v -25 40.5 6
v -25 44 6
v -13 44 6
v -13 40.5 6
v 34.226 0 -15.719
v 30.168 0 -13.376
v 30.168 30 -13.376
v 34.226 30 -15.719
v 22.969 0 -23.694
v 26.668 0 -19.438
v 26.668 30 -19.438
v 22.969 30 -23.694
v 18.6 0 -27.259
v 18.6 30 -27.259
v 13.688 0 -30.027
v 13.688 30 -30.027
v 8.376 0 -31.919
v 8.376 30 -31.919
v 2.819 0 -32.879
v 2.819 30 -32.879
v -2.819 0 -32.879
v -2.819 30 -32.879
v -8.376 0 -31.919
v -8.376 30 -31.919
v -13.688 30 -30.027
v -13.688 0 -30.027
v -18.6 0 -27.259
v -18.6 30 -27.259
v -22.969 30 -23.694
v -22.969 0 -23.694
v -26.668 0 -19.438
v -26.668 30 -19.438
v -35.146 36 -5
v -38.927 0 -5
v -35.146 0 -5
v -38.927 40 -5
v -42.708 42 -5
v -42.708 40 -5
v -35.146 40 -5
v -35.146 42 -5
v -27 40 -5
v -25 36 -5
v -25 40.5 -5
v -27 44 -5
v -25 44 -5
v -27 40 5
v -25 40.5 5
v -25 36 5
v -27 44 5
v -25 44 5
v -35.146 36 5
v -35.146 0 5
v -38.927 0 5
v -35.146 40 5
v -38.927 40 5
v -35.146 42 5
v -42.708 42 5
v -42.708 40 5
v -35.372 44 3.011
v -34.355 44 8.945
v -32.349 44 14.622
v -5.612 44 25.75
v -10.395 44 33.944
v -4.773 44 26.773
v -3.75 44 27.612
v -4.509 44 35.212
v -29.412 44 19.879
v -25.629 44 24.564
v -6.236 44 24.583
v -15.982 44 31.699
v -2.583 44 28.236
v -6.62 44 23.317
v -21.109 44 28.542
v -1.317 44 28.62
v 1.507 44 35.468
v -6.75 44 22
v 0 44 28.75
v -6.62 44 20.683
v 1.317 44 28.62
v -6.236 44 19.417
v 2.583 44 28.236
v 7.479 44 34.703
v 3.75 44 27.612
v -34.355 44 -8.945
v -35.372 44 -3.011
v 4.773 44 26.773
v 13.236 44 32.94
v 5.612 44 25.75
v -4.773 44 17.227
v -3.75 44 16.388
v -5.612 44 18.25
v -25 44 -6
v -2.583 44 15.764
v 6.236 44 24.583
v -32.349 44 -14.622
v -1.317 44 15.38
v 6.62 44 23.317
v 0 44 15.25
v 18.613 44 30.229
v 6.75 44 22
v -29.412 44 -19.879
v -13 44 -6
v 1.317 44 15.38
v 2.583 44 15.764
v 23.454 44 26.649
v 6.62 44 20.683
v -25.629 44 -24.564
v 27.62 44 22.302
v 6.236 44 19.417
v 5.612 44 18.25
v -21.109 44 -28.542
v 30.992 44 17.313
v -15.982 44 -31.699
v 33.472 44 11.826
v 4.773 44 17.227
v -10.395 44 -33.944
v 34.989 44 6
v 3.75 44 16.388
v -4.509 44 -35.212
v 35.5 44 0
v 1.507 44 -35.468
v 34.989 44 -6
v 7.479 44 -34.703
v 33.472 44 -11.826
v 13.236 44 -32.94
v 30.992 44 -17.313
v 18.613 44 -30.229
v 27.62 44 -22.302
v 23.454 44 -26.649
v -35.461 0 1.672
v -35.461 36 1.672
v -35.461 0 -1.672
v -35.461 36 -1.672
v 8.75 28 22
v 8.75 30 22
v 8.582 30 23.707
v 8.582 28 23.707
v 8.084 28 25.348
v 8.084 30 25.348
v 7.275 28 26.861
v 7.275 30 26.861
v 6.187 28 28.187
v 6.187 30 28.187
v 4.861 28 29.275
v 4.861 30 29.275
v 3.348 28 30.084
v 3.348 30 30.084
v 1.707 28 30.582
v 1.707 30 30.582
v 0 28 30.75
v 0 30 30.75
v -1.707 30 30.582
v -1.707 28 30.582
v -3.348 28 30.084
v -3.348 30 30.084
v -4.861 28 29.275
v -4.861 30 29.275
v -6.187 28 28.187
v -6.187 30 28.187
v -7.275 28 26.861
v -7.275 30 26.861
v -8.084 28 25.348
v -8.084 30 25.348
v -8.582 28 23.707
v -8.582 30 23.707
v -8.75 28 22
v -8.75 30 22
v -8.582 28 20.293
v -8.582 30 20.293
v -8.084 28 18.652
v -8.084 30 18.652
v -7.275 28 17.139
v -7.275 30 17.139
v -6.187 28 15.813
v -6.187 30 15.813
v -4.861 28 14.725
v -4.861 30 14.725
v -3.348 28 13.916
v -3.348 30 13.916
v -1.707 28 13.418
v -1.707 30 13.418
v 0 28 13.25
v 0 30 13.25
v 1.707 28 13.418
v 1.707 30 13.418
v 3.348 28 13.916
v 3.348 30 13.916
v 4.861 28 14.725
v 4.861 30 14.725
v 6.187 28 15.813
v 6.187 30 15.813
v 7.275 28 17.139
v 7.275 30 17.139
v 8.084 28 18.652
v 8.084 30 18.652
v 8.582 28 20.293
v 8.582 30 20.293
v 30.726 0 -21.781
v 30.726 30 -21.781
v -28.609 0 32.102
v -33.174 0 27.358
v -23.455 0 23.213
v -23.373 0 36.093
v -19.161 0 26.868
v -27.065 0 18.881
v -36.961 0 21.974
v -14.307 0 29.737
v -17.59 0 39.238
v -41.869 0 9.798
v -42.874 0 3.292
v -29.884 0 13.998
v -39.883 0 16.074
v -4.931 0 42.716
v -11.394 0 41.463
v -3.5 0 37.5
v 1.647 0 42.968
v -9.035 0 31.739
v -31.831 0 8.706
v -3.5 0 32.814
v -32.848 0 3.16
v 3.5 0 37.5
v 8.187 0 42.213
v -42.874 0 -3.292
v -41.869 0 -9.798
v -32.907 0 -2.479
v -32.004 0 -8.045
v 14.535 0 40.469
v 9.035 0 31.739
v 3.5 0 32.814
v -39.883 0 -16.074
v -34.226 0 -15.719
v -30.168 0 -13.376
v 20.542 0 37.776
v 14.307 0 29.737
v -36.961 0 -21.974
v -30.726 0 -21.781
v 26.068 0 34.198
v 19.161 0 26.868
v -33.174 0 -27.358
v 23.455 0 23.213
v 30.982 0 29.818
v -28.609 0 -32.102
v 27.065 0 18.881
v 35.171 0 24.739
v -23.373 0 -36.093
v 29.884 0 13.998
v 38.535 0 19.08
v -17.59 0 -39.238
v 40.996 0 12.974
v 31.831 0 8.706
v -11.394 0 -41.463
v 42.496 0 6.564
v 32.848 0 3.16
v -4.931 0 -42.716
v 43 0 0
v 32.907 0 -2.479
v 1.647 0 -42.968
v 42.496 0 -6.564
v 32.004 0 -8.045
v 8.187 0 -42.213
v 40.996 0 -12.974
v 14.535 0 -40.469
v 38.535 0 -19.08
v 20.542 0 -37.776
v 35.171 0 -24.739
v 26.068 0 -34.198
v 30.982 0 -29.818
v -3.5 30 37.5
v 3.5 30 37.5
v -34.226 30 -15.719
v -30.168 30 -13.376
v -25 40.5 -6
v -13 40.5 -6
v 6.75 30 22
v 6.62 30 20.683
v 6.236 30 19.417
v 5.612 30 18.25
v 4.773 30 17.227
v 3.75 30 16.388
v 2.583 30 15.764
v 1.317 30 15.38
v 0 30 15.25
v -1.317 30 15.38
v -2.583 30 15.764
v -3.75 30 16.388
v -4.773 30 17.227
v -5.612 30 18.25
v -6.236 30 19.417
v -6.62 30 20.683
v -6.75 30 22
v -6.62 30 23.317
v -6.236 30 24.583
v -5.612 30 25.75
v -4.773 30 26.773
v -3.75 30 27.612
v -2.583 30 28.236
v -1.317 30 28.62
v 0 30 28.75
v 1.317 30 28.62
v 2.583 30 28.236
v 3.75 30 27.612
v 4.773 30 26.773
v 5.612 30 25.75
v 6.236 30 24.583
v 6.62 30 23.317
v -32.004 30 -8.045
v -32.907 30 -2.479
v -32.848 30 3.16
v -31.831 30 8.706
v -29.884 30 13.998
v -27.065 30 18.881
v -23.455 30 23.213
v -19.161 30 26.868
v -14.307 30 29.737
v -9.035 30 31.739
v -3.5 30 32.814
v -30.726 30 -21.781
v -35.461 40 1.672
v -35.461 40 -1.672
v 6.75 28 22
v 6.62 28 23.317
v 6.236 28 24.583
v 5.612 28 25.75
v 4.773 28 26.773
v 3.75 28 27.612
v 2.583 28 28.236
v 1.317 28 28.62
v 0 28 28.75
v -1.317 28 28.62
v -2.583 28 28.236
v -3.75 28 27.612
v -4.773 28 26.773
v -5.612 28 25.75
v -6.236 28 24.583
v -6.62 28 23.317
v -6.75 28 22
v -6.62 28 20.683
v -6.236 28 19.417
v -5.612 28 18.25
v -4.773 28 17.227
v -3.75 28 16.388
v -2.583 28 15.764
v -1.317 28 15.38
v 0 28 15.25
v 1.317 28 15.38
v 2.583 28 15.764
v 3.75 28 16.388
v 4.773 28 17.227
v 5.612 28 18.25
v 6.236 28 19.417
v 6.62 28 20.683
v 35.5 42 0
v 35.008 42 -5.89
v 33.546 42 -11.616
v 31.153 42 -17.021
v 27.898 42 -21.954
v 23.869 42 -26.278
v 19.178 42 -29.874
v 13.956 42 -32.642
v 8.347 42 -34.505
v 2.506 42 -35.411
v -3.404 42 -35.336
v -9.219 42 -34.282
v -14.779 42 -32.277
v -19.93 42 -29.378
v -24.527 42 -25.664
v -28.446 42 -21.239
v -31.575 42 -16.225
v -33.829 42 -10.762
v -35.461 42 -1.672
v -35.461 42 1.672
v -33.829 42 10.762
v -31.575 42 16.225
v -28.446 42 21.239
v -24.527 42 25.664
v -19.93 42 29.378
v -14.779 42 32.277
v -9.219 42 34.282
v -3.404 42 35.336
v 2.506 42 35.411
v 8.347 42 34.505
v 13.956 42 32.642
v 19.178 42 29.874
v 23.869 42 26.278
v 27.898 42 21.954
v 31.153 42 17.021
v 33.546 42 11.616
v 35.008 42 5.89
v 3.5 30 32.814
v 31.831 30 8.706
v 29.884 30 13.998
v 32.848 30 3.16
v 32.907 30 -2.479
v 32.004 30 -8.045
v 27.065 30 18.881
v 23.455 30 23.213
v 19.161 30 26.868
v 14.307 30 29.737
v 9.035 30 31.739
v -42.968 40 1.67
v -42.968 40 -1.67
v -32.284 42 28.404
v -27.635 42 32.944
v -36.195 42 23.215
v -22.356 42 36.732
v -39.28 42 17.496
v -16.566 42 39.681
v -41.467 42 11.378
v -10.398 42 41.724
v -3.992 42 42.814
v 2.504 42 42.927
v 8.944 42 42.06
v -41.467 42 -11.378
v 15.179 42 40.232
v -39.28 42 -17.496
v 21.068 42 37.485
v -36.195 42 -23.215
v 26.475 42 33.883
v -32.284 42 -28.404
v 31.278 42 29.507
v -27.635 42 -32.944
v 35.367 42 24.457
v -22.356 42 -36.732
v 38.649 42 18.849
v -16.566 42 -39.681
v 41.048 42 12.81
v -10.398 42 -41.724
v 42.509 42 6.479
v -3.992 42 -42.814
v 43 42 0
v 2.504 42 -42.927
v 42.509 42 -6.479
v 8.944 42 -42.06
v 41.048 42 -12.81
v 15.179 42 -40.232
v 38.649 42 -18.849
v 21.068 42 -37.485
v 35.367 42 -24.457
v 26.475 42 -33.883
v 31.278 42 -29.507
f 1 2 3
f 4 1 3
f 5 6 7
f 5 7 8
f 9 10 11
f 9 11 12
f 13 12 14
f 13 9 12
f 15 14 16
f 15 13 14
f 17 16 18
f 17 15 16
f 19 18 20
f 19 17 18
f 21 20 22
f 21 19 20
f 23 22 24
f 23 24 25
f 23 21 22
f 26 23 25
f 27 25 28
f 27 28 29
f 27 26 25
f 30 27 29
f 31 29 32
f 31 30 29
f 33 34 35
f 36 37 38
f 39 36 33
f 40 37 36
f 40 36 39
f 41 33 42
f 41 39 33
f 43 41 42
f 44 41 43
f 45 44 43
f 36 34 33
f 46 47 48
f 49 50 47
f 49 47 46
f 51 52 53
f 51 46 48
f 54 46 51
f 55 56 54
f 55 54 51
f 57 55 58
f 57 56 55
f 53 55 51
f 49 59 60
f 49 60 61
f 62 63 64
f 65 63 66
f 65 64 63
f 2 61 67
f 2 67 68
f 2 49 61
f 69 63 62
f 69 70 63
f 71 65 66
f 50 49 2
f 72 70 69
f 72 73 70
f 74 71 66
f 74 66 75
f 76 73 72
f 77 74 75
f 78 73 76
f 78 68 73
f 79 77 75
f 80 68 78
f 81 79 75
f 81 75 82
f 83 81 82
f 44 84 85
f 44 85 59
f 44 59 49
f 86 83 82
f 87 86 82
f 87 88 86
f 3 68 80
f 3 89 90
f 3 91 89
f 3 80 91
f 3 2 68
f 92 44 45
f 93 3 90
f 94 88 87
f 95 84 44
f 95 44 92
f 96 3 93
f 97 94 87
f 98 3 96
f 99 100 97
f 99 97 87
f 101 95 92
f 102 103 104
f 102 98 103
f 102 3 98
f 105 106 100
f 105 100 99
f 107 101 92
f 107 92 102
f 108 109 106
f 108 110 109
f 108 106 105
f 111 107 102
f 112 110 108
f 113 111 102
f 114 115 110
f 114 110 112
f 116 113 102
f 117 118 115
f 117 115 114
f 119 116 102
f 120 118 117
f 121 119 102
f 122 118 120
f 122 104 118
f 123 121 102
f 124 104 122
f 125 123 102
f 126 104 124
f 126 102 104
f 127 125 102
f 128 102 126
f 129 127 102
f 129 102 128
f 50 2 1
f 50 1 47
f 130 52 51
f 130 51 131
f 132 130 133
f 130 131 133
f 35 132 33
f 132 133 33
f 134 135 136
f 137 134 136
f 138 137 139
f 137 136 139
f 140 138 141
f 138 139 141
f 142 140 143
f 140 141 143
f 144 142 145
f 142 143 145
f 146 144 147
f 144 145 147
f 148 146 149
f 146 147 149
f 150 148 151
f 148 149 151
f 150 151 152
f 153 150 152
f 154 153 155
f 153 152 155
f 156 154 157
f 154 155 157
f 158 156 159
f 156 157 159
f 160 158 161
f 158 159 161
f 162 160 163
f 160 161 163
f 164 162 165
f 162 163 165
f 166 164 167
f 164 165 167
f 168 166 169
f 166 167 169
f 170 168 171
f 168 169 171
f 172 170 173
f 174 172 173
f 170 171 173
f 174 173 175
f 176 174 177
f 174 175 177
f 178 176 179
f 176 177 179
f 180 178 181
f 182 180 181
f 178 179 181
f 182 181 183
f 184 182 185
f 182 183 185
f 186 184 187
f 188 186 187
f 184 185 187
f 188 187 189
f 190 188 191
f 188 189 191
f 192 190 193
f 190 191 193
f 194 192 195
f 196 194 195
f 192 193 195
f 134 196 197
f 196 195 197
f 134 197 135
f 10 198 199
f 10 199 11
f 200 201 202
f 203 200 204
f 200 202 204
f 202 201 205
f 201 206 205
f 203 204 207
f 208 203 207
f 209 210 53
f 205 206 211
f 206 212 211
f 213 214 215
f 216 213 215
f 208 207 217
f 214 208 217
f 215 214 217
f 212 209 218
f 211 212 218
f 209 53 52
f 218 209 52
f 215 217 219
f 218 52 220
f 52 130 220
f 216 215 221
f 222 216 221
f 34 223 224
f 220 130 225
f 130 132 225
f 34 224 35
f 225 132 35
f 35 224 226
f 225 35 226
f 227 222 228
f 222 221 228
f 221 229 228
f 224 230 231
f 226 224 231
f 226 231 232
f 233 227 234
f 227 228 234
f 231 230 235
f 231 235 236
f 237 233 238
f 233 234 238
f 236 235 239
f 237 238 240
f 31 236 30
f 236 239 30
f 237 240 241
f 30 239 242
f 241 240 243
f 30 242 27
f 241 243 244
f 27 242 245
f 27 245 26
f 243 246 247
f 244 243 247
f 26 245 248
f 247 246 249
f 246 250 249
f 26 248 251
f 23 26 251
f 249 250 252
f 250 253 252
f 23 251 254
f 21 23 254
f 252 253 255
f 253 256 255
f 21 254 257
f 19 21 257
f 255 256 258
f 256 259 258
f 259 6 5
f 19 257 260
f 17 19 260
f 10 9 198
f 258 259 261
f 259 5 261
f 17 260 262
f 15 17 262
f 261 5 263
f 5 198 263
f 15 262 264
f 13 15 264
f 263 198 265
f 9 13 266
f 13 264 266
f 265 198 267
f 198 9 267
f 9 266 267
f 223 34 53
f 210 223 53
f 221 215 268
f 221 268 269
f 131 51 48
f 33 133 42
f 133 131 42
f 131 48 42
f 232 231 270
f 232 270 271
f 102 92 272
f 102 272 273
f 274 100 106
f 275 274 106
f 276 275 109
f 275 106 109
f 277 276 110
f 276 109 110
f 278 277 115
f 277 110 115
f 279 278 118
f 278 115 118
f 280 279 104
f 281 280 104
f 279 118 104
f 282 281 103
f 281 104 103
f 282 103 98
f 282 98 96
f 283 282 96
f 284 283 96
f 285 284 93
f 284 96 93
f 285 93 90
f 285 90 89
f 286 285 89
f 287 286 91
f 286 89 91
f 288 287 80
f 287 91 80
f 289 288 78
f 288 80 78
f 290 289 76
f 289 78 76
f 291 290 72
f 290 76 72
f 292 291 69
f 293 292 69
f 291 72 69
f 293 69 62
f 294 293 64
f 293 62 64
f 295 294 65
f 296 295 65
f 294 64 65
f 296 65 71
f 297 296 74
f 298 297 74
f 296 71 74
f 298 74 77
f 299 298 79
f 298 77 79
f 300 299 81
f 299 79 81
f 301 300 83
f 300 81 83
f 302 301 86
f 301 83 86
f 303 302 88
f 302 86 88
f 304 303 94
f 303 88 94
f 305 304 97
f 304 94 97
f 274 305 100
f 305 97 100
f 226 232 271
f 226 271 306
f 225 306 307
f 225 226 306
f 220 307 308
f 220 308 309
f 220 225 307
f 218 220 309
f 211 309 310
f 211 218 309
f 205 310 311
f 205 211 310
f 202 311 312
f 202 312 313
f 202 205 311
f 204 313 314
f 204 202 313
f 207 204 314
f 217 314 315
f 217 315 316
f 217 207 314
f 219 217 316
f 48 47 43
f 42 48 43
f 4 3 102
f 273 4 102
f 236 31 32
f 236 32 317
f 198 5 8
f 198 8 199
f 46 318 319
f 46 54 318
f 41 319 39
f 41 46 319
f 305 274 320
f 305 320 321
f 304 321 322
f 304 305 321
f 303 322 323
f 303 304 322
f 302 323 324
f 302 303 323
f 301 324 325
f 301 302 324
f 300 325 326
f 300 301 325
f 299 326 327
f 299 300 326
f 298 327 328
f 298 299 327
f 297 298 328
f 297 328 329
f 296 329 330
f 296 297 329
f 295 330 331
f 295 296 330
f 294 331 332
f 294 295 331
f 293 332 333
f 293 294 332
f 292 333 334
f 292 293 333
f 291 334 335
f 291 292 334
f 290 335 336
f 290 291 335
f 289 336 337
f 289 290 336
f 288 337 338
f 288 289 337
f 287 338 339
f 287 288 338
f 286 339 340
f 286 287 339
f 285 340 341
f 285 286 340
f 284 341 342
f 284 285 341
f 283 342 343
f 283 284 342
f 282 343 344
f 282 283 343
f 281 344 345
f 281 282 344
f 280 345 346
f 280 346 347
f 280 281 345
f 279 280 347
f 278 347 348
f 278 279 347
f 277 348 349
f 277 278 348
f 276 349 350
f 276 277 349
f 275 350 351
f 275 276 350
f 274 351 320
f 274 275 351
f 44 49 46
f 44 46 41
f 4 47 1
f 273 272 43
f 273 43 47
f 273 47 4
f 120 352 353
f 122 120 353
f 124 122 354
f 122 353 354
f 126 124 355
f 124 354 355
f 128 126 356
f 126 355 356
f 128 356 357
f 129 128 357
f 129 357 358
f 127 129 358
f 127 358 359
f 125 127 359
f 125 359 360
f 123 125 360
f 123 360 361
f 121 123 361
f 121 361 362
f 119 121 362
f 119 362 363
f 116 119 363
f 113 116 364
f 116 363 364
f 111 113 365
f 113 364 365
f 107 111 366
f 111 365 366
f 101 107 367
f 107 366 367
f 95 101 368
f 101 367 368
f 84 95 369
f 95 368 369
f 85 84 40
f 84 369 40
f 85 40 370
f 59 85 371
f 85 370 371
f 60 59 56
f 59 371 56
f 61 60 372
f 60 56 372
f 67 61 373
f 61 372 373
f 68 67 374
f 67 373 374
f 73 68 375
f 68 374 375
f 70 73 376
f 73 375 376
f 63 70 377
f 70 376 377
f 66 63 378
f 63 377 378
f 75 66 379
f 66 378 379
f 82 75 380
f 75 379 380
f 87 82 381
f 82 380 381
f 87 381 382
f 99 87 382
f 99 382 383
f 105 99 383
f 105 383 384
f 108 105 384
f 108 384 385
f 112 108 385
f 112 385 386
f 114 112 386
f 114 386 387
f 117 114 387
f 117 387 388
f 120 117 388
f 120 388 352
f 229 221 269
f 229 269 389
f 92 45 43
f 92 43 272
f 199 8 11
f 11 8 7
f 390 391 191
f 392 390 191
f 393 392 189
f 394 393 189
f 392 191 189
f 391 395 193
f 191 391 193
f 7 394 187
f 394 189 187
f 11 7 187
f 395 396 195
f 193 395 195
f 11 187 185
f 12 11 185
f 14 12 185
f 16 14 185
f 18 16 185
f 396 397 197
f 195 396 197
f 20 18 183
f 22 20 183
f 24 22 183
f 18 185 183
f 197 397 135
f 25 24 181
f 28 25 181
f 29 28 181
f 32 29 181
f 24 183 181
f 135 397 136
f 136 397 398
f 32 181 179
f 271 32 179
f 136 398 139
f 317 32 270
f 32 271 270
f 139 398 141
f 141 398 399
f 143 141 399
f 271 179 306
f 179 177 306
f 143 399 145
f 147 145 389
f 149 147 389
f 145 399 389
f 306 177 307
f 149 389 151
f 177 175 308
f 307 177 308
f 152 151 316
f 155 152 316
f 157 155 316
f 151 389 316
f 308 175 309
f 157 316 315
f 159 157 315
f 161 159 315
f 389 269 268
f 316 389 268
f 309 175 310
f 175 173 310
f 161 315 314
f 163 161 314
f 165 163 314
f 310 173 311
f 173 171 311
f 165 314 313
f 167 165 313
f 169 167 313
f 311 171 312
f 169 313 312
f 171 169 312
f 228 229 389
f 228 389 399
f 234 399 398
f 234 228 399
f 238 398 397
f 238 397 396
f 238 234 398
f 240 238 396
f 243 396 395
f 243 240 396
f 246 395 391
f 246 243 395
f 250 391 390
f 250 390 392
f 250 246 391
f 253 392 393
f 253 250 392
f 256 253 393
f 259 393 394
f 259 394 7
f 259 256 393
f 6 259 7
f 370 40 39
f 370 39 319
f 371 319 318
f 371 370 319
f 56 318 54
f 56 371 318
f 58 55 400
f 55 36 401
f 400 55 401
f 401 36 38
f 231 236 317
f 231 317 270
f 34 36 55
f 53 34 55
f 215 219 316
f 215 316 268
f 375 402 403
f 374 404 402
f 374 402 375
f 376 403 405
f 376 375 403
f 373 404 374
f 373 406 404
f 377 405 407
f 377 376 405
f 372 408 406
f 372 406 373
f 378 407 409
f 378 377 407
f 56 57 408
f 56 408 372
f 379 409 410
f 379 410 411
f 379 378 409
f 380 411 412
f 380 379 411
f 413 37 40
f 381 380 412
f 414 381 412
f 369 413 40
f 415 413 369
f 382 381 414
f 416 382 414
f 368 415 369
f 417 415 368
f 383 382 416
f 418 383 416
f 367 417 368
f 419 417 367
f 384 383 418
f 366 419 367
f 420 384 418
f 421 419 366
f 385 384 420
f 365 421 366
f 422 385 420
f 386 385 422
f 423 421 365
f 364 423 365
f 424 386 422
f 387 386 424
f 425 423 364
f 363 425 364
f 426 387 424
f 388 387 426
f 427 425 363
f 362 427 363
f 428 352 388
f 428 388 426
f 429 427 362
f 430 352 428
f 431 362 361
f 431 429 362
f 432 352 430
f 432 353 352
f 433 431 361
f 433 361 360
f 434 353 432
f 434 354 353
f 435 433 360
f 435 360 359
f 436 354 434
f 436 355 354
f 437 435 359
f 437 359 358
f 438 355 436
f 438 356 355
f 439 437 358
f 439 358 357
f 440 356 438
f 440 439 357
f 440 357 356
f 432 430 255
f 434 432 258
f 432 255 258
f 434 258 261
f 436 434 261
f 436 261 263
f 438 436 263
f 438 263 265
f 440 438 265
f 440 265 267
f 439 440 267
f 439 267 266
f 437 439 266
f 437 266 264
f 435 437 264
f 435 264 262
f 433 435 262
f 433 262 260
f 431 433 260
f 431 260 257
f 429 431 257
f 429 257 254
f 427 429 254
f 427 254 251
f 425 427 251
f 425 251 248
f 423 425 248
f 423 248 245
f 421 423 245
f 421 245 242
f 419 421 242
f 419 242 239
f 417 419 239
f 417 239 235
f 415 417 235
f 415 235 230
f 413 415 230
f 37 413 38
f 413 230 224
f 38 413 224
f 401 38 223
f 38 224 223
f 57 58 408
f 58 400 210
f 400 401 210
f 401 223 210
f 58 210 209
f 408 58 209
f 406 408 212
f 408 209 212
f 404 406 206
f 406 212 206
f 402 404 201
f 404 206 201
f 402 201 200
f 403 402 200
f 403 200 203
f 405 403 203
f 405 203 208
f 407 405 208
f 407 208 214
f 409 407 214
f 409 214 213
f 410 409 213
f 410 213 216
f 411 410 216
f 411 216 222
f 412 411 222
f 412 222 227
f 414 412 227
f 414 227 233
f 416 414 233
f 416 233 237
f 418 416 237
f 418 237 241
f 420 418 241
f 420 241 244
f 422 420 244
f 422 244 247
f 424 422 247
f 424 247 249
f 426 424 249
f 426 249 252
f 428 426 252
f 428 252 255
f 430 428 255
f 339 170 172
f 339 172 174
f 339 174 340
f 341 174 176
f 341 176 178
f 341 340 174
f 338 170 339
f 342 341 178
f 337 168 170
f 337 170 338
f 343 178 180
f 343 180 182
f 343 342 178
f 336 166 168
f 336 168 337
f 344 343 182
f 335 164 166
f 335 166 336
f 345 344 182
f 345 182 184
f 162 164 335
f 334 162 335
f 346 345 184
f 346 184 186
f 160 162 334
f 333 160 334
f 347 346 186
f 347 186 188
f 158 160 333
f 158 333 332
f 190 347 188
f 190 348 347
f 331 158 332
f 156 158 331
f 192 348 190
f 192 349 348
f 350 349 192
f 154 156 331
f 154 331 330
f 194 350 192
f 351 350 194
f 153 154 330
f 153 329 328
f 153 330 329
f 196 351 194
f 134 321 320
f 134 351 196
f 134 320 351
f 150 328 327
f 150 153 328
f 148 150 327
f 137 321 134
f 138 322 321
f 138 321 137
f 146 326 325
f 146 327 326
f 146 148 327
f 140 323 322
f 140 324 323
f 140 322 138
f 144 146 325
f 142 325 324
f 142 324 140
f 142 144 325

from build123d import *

# Parameters (mm, degrees)
SKETCH2_R           = 43
BOSS_EXTRUDE1_DEPTH = 42
SKETCH3_R           = 35.5
BOSS_EXTRUDE2_DEPTH = 2
CUT_EXTRUDE1_DEPTH  = 30
SKETCH6_W           = 12
SKETCH6_H           = 12
CUT_EXTRUDE2_DEPTH  = 3.5
SKETCH5_W           = 2
SKETCH5_H           = 10
CUT_EXTRUDE3_DEPTH  = 8
SKETCH7_R           = 6.75
CUT_EXTRUDE4_DEPTH  = 14
CUT_EXTRUDE5_DEPTH  = 2
CUT_EXTRUDE6_DEPTH  = 41
SKETCH10_W          = 10
SKETCH10_H          = 4
CUT_EXTRUDE7_DEPTH  = 10
SKETCH11_R          = 8.75
SKETCH11_R_2        = 6.75
BOSS_EXTRUDE3_DEPTH = 2


with BuildPart() as part:
    # Sketch2 → Boss-Extrude1 (new body)
    with BuildSketch(Plane(origin=(0, 0, 0), x_dir=(1, 0, 0), z_dir=(0, 1, 0))):
        Circle(SKETCH2_R)
    extrude(amount=BOSS_EXTRUDE1_DEPTH)

    # Sketch3 → Boss-Extrude2 (add)
    with BuildSketch(Plane(origin=(0, 42, 0), x_dir=(1, 0, 0), z_dir=(0, 1, 0))):
        Circle(SKETCH3_R)
    extrude(amount=BOSS_EXTRUDE2_DEPTH)

    # Sketch4 → Cut-Extrude1 (cut)
    with BuildSketch(Plane.XZ):
        with BuildLine():
            Line((-3.5, 32.813869019), (-3.5, 37.5))
            Line((-3.5, 37.5), (3.5, 37.5))
            Line((3.5, 37.5), (3.5, 32.813869019))
            ThreePointArc((3.5, 32.813869019), (28.578838325, 16.5), (30.167644167, -13.375845596))
            Line((30.167644167, -13.375845596), (34.225952642, -15.718911087))
            Line((34.225952642, -15.718911087), (30.725952642, -21.781088913))
            Line((30.725952642, -21.781088913), (26.667644167, -19.438023423))
            ThreePointArc((26.667644167, -19.438023423), (0, -33), (-26.667644167, -19.438023423))
            Line((-26.667644167, -19.438023423), (-30.725952642, -21.781088913))
            Line((-30.725952642, -21.781088913), (-34.225952642, -15.718911087))
            Line((-34.225952642, -15.718911087), (-30.167644167, -13.375845596))
            ThreePointArc((-30.167644167, -13.375845596), (-28.578838325, 16.5), (-3.5, 32.813869019))
        make_face()
    extrude(amount=-CUT_EXTRUDE1_DEPTH, mode=Mode.SUBTRACT)

    # Sketch6 → Cut-Extrude2 (cut)
    with BuildSketch(Plane(origin=(0, 44, 0), x_dir=(1, 0, 0), z_dir=(0, 1, 0))):
        with Locations((-19, 0)):
            Rectangle(SKETCH6_W, SKETCH6_H)
    extrude(amount=-CUT_EXTRUDE2_DEPTH, mode=Mode.SUBTRACT)

    # Sketch5 → Cut-Extrude3 (cut)
    with BuildSketch(Plane(origin=(0, 44, 0), x_dir=(1, 0, 0), z_dir=(0, 1, 0))):
        with Locations((-26, 0)):
            Rectangle(SKETCH5_W, SKETCH5_H)
    extrude(amount=-CUT_EXTRUDE3_DEPTH, mode=Mode.SUBTRACT)

    # Sketch7 → Cut-Extrude4 (cut)
    with BuildSketch(Plane(origin=(0, 44, 0), x_dir=(1, 0, 0), z_dir=(0, 1, 0))):
        with Locations((0, -22)):
            Circle(SKETCH7_R)
    extrude(amount=-CUT_EXTRUDE4_DEPTH, mode=Mode.SUBTRACT)

    # Sketch8 → Cut-Extrude5 (cut)
    with BuildSketch(Plane(origin=(0, 42, 0), x_dir=(1, 0, 0), z_dir=(0, 1, 0))):
        with BuildLine():
            Line((-42.708313008, 5), (-35.146123542, 5))
            ThreePointArc((-35.146123542, 5), (-35.5, 0), (-35.146123542, -5))
            Line((-35.146123542, -5), (-42.708313008, -5))
            ThreePointArc((-42.708313008, -5), (-43, 0), (-42.708313008, 5))
        make_face()
    extrude(amount=-CUT_EXTRUDE5_DEPTH, mode=Mode.SUBTRACT)

    # Sketch9 → Cut-Extrude6 (cut)
    with BuildSketch(Plane(origin=(0, 40, 0), x_dir=(1, 0, 0), z_dir=(0, 1, 0))):
        with BuildLine():
            Line((-35.146123542, 5), (-38.927218275, 5))
            Line((-38.927218275, 5), (-38.927218275, -5))
            Line((-38.927218275, -5), (-35.146123542, -5))
            ThreePointArc((-35.146123542, -5), (-35.5, 0), (-35.146123542, 5))
        make_face()
    extrude(amount=-CUT_EXTRUDE6_DEPTH, mode=Mode.SUBTRACT)

    # Sketch10 → Cut-Extrude7 (cut)
    with BuildSketch(Plane(origin=(-27, 0, 0), x_dir=(0, 0, -1), z_dir=(1, 0, 0))):
        with Locations((0, 38)):
            Rectangle(SKETCH10_W, SKETCH10_H)
    extrude(amount=-CUT_EXTRUDE7_DEPTH, mode=Mode.SUBTRACT)

    # Sketch11 → Boss-Extrude3 (add)
    with BuildSketch(Plane.XZ.offset(-30)):
        with Locations((0, 22)):
            Circle(SKETCH11_R)
        with Locations((0, 22)):
            Circle(SKETCH11_R_2, mode=Mode.SUBTRACT)
    extrude(amount=BOSS_EXTRUDE3_DEPTH)


solid = part.part
